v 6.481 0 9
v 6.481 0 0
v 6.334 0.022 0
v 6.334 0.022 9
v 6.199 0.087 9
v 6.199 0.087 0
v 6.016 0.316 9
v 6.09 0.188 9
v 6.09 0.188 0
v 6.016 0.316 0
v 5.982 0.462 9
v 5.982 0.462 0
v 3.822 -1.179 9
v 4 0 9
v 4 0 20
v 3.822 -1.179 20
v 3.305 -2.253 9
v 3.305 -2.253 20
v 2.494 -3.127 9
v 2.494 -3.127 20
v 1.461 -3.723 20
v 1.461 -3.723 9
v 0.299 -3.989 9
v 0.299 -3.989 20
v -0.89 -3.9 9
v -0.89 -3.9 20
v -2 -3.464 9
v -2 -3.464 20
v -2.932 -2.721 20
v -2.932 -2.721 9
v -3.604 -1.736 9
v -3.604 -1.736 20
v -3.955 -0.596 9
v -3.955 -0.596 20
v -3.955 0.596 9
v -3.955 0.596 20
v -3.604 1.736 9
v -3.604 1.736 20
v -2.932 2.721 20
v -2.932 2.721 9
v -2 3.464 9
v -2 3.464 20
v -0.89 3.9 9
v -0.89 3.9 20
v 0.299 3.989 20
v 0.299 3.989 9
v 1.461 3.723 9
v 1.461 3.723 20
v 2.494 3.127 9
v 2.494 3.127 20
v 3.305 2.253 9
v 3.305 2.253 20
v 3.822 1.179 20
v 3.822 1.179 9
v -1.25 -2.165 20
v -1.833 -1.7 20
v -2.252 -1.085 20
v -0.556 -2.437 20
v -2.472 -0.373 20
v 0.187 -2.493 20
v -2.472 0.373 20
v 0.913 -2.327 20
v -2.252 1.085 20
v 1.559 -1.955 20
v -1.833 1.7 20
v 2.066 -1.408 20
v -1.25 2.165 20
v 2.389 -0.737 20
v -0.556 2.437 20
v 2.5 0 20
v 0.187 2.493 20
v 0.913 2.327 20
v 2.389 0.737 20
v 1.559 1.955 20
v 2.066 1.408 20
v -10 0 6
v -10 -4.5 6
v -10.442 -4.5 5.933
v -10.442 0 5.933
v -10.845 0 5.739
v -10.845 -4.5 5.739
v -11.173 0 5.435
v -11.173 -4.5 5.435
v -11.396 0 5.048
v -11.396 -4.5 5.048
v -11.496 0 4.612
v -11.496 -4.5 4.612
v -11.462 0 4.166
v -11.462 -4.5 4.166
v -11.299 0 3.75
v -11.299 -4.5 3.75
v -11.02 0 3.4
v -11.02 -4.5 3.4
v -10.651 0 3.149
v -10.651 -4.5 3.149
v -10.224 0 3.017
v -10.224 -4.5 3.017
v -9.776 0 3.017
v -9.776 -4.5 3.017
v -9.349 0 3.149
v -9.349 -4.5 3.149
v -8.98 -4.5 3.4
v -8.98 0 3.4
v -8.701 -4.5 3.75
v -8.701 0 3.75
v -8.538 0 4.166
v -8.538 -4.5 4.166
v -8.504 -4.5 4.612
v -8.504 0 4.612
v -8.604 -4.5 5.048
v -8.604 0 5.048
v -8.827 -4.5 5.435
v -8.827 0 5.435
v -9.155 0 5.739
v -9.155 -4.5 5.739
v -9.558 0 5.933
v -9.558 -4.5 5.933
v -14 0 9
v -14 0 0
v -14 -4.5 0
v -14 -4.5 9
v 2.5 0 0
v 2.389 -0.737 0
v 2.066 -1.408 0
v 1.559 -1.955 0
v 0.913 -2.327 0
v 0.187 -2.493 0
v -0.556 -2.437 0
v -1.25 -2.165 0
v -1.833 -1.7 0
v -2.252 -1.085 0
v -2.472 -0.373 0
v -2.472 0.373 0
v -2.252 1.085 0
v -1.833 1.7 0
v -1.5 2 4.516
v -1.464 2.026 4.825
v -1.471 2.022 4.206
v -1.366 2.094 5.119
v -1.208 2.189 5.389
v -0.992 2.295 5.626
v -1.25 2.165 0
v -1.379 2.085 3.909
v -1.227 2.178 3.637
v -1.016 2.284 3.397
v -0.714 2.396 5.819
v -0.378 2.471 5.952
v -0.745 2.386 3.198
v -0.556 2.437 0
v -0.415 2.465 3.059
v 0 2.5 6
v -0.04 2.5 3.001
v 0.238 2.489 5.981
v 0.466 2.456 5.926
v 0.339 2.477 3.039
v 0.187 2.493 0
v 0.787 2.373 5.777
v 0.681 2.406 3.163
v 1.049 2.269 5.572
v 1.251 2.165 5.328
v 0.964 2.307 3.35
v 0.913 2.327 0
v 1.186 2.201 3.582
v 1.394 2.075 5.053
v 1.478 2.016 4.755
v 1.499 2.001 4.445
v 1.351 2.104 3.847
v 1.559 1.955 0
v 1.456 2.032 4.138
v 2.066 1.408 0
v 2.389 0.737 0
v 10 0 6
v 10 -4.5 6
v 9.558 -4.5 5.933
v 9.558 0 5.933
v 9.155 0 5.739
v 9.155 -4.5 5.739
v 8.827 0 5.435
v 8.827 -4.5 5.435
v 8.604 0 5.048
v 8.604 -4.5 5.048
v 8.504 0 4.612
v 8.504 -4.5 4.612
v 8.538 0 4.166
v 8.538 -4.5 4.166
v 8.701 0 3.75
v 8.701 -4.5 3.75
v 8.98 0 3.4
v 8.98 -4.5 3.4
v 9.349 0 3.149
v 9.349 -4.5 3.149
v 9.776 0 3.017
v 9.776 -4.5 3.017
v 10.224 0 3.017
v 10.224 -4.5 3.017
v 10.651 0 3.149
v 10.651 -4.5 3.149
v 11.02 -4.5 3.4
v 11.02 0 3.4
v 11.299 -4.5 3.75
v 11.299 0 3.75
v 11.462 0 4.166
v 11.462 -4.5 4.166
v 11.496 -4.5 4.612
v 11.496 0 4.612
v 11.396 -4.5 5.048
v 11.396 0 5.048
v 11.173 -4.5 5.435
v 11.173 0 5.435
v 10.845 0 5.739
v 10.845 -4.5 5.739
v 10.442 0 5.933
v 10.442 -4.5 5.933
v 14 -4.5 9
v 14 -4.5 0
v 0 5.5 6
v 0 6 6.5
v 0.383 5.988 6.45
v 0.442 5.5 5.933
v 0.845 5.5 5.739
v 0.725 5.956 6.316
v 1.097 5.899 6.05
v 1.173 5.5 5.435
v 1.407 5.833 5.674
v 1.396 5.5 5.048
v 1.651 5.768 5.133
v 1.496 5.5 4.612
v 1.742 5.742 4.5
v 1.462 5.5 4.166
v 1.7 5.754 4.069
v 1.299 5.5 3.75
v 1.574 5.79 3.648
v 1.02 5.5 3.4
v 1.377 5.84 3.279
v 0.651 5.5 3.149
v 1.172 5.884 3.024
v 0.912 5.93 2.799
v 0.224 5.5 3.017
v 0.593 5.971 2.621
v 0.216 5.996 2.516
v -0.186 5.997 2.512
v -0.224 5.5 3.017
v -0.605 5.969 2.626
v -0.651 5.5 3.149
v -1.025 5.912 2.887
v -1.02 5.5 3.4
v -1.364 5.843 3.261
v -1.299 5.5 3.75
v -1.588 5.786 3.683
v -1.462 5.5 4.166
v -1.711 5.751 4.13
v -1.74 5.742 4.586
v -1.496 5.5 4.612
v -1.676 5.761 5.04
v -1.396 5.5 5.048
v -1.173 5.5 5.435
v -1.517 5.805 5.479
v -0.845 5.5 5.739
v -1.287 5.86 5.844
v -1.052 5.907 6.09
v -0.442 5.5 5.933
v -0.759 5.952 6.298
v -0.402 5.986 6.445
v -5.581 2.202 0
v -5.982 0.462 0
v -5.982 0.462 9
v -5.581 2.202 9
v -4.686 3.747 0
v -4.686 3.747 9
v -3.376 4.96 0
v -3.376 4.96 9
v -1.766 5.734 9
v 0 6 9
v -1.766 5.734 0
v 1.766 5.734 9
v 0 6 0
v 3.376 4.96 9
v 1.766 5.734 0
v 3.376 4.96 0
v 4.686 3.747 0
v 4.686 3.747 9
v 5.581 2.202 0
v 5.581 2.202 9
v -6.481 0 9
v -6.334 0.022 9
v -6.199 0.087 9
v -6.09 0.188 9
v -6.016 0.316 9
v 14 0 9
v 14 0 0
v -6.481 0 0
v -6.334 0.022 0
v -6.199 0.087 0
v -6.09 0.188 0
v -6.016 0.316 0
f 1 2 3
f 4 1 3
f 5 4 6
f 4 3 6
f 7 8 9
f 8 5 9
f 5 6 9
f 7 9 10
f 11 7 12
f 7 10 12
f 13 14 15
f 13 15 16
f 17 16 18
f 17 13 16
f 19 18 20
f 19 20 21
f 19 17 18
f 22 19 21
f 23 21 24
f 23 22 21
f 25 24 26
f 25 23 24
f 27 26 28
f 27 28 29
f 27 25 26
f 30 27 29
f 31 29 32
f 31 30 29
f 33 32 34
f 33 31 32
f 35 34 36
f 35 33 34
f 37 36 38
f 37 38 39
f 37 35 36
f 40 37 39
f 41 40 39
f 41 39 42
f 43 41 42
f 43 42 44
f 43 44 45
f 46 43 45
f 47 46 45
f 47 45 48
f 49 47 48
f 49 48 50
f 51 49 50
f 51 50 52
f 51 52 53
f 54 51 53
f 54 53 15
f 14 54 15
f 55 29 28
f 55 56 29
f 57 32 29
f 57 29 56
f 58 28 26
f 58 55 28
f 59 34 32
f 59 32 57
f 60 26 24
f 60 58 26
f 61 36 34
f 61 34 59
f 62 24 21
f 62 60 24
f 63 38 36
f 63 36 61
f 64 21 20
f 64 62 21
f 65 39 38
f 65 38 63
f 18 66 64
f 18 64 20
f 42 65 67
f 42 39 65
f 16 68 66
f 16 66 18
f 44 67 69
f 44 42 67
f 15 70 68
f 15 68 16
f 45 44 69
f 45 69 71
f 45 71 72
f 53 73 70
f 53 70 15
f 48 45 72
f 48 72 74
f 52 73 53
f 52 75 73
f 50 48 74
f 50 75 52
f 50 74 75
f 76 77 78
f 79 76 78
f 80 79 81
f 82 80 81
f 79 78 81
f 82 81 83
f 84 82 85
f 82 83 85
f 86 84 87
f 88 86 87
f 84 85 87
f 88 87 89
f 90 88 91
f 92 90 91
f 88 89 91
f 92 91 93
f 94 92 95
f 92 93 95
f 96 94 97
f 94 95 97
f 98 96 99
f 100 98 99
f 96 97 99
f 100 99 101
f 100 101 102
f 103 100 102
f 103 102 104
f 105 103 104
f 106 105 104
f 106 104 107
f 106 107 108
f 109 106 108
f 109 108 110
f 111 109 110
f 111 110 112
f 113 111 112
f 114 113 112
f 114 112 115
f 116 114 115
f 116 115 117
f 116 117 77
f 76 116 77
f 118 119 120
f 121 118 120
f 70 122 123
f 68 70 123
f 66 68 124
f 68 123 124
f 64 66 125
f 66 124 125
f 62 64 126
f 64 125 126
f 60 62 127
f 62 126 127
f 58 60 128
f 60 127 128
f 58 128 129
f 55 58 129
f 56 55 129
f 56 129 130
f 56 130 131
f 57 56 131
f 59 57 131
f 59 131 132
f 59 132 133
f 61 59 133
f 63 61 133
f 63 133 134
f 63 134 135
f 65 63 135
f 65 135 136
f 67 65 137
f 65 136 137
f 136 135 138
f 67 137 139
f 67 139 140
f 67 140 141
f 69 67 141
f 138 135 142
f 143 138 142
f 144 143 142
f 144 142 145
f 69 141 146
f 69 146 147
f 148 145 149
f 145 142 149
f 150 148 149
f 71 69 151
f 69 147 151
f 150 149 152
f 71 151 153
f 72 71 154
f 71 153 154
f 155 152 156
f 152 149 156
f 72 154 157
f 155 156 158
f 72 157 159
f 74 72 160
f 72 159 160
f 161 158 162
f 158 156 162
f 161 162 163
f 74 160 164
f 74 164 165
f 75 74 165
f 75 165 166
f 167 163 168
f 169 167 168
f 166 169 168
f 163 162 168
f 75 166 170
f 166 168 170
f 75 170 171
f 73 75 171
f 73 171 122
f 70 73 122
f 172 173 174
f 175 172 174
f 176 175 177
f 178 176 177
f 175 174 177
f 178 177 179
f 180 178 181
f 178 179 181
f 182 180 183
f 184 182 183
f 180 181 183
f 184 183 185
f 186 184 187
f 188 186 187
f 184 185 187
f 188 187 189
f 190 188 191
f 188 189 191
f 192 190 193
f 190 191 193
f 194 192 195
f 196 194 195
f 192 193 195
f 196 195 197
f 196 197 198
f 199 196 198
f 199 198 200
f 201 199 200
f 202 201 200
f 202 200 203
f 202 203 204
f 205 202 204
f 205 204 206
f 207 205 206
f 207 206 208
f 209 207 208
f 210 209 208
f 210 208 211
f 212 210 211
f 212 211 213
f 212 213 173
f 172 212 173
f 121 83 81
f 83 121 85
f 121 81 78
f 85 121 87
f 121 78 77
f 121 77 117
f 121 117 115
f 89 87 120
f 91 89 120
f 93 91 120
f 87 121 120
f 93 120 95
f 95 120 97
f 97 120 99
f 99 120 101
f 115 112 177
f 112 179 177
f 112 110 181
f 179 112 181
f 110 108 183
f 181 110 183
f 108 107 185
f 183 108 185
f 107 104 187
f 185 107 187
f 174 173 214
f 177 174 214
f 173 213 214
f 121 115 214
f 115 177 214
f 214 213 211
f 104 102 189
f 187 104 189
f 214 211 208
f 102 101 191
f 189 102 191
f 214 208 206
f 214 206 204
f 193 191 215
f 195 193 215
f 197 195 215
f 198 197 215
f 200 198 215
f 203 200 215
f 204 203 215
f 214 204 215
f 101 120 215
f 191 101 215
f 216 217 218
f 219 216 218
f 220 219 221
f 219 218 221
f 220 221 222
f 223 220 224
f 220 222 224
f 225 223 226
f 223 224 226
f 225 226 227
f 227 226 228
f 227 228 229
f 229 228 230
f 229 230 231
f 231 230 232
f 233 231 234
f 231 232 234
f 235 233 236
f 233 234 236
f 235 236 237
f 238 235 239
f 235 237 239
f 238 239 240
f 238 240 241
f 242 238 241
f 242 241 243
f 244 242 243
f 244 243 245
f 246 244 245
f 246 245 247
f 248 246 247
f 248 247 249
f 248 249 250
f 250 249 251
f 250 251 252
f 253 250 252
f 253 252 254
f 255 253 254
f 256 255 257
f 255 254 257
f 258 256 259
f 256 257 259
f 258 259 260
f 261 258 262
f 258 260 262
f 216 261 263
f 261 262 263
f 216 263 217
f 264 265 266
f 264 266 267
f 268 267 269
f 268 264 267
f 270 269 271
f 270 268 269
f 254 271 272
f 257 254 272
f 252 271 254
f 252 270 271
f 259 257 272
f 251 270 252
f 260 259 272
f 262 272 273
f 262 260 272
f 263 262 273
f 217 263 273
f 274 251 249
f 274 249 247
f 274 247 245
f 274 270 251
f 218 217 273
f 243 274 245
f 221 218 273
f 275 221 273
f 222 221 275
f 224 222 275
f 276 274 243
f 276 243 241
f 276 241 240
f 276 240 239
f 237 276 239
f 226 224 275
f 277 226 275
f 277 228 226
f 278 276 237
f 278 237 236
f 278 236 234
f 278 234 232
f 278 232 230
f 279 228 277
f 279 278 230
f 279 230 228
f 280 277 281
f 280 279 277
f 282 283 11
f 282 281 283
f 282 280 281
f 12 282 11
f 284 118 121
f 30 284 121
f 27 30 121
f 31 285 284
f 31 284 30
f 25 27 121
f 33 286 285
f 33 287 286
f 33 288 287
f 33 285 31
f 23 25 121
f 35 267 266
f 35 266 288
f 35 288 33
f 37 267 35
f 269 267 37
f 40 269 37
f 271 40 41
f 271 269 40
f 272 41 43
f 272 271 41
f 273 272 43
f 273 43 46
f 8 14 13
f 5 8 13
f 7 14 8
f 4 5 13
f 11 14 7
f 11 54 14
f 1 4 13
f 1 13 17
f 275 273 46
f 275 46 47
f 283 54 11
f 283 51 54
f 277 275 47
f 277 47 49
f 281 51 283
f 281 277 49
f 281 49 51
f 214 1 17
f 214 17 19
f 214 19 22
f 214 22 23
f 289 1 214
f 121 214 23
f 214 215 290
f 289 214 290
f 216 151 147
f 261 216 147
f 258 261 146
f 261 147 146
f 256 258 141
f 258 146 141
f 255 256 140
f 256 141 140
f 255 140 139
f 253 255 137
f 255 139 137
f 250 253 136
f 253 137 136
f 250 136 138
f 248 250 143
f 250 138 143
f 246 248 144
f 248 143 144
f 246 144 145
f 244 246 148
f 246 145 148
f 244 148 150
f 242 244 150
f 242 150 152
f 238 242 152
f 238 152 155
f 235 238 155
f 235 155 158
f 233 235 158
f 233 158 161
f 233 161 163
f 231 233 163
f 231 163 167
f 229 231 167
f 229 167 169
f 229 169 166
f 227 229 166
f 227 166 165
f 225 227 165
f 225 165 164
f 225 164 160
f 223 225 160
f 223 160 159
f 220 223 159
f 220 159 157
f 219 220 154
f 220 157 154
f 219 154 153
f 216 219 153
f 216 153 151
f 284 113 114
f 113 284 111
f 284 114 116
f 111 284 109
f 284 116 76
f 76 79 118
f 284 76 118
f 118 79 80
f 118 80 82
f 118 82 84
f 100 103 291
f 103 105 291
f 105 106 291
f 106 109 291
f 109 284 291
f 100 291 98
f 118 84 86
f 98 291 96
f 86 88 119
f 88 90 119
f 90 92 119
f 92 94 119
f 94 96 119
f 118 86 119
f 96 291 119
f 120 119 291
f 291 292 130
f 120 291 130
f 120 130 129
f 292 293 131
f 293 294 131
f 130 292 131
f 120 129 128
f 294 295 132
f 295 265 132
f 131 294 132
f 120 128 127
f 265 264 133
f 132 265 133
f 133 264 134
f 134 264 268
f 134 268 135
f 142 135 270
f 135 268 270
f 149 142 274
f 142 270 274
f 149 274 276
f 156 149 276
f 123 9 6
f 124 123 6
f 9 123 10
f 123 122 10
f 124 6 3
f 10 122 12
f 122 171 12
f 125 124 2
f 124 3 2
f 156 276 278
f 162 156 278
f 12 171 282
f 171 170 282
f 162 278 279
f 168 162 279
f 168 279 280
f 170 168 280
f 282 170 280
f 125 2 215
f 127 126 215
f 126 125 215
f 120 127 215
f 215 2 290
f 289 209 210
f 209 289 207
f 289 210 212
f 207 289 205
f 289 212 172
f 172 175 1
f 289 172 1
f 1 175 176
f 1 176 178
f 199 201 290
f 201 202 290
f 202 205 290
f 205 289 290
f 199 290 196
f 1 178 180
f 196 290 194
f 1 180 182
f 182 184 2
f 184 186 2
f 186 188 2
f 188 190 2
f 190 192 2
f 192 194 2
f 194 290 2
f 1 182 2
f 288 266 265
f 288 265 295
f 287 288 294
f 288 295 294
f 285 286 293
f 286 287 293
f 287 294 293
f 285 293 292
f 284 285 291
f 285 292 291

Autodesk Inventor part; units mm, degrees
ref_plane "YZ Plane" through (0, 0, 0) normal (1, 0, 0) x (0, 1, 0)
ref_plane "XZ Plane" through (0, 0, 0) normal (0, 1, 0) x (-1, 0, 0)
ref_plane "XY Plane" through (0, 0, 0) normal (0, 0, 1) x (1, 0, 0)
sketch "Sketch1" plane through (0, 0, 0) normal (0, 0, 1) x (1, 0, 0)
  line L0 (14, 0) -> (-14, 0)
  line L1 (-14, 0) -> (-14, -4.5)
  line L2 (-14, -4.5) -> (14, -4.5)
  line L3 (14, -4.5) -> (14, 0)
  line L4 (0, 29.3592) -> (0, -29.3592) construction
  arc A0 (5.9822, 0.4615) -> (-5.9822, 0.4615) centre (0, 0) ccw
  circle A1 centre (0, 0) radius 2.5
  circle A2 centre (0, 0) radius 4
  arc A3 (5.9822, 0.4615) -> (6.4807, 0) centre (6.4807, 0.5) ccw
  arc A4 (-6.4807, 0) -> (-5.9822, 0.4615) centre (-6.4807, 0.5) ccw
  dimension "d0" = 14
  dimension "d1" = 4.5
  dimension "d2" = 12
  dimension "d3" = 8
  dimension "d4" = 5
  dimension "d5" = 1
  dimension "d6" = 1
extrude "Extrusion1" add sketch "Sketch1" along normal blind 9 contours L3 L2 L1 L0 A2 | L0 A2 A4 A0 A3
extrude "Extrusion2" add sketch "Sketch1" along normal blind 20 contours A2 L0 A1 | L0 A1 A2
ref_plane "Plano de trabajo2" through (-14, 6, 0) normal (0, 1, 0) x (1, 0, 0)
sketch "Boceto3" plane through (-14, 6, 0) normal (0, 1, 0) x (1, 0, 0)
  line L0 (14, 0) -> (14, -9) construction
  line L1 (8.0178, -9) -> (19.9822, -9) projected
  line L2 (0, 0) -> (0, -9) projected
  line L3 (0, -4.5) -> (28, -4.5) construction
  line L4 (28, 0) -> (28, -9) projected
  circle A0 centre (4, -4.5) radius 1.5
  circle A1 centre (14, -4.5) radius 1.5
  circle A2 centre (24, -4.5) radius 1.5
  line L5 (7.5193, 0) -> (0, 0) projected
  line L6 (0, 0) -> (0, -9) projected
  line L7 (7.5193, -9) -> (0, -9) projected
  line L8 (7.5193, 0) -> (7.5193, -9) projected
  line L9 (19.9822, 0) -> (8.0178, 0) projected
  line L10 (8.0178, 0) -> (8.0178, -9) projected
  line L11 (19.9822, -9) -> (8.0178, -9) projected
  line L12 (19.9822, 0) -> (19.9822, -9) projected
  line L13 (28, 0) -> (20.4807, 0) projected
  line L14 (20.4807, 0) -> (20.4807, -9) projected
  line L15 (28, -9) -> (20.4807, -9) projected
  line L16 (28, 0) -> (28, -9) projected
  dimension "d25" = 3
  dimension "d26" = 3
  dimension "d27" = 3
  dimension "d28" = 10
  dimension "d29" = 10
hole "Agujero2" at (0, 6, 4.5) direction (0, -1, 0) diameter 3 depth 5 countersink diameter 4 countersink angle 90
hole "Agujero3" at (-10, 6, 4.5) at (10, 6, 4.5) direction (0, -1, 0) diameter 3 end through all
properties part number "Hudson 1-71"
